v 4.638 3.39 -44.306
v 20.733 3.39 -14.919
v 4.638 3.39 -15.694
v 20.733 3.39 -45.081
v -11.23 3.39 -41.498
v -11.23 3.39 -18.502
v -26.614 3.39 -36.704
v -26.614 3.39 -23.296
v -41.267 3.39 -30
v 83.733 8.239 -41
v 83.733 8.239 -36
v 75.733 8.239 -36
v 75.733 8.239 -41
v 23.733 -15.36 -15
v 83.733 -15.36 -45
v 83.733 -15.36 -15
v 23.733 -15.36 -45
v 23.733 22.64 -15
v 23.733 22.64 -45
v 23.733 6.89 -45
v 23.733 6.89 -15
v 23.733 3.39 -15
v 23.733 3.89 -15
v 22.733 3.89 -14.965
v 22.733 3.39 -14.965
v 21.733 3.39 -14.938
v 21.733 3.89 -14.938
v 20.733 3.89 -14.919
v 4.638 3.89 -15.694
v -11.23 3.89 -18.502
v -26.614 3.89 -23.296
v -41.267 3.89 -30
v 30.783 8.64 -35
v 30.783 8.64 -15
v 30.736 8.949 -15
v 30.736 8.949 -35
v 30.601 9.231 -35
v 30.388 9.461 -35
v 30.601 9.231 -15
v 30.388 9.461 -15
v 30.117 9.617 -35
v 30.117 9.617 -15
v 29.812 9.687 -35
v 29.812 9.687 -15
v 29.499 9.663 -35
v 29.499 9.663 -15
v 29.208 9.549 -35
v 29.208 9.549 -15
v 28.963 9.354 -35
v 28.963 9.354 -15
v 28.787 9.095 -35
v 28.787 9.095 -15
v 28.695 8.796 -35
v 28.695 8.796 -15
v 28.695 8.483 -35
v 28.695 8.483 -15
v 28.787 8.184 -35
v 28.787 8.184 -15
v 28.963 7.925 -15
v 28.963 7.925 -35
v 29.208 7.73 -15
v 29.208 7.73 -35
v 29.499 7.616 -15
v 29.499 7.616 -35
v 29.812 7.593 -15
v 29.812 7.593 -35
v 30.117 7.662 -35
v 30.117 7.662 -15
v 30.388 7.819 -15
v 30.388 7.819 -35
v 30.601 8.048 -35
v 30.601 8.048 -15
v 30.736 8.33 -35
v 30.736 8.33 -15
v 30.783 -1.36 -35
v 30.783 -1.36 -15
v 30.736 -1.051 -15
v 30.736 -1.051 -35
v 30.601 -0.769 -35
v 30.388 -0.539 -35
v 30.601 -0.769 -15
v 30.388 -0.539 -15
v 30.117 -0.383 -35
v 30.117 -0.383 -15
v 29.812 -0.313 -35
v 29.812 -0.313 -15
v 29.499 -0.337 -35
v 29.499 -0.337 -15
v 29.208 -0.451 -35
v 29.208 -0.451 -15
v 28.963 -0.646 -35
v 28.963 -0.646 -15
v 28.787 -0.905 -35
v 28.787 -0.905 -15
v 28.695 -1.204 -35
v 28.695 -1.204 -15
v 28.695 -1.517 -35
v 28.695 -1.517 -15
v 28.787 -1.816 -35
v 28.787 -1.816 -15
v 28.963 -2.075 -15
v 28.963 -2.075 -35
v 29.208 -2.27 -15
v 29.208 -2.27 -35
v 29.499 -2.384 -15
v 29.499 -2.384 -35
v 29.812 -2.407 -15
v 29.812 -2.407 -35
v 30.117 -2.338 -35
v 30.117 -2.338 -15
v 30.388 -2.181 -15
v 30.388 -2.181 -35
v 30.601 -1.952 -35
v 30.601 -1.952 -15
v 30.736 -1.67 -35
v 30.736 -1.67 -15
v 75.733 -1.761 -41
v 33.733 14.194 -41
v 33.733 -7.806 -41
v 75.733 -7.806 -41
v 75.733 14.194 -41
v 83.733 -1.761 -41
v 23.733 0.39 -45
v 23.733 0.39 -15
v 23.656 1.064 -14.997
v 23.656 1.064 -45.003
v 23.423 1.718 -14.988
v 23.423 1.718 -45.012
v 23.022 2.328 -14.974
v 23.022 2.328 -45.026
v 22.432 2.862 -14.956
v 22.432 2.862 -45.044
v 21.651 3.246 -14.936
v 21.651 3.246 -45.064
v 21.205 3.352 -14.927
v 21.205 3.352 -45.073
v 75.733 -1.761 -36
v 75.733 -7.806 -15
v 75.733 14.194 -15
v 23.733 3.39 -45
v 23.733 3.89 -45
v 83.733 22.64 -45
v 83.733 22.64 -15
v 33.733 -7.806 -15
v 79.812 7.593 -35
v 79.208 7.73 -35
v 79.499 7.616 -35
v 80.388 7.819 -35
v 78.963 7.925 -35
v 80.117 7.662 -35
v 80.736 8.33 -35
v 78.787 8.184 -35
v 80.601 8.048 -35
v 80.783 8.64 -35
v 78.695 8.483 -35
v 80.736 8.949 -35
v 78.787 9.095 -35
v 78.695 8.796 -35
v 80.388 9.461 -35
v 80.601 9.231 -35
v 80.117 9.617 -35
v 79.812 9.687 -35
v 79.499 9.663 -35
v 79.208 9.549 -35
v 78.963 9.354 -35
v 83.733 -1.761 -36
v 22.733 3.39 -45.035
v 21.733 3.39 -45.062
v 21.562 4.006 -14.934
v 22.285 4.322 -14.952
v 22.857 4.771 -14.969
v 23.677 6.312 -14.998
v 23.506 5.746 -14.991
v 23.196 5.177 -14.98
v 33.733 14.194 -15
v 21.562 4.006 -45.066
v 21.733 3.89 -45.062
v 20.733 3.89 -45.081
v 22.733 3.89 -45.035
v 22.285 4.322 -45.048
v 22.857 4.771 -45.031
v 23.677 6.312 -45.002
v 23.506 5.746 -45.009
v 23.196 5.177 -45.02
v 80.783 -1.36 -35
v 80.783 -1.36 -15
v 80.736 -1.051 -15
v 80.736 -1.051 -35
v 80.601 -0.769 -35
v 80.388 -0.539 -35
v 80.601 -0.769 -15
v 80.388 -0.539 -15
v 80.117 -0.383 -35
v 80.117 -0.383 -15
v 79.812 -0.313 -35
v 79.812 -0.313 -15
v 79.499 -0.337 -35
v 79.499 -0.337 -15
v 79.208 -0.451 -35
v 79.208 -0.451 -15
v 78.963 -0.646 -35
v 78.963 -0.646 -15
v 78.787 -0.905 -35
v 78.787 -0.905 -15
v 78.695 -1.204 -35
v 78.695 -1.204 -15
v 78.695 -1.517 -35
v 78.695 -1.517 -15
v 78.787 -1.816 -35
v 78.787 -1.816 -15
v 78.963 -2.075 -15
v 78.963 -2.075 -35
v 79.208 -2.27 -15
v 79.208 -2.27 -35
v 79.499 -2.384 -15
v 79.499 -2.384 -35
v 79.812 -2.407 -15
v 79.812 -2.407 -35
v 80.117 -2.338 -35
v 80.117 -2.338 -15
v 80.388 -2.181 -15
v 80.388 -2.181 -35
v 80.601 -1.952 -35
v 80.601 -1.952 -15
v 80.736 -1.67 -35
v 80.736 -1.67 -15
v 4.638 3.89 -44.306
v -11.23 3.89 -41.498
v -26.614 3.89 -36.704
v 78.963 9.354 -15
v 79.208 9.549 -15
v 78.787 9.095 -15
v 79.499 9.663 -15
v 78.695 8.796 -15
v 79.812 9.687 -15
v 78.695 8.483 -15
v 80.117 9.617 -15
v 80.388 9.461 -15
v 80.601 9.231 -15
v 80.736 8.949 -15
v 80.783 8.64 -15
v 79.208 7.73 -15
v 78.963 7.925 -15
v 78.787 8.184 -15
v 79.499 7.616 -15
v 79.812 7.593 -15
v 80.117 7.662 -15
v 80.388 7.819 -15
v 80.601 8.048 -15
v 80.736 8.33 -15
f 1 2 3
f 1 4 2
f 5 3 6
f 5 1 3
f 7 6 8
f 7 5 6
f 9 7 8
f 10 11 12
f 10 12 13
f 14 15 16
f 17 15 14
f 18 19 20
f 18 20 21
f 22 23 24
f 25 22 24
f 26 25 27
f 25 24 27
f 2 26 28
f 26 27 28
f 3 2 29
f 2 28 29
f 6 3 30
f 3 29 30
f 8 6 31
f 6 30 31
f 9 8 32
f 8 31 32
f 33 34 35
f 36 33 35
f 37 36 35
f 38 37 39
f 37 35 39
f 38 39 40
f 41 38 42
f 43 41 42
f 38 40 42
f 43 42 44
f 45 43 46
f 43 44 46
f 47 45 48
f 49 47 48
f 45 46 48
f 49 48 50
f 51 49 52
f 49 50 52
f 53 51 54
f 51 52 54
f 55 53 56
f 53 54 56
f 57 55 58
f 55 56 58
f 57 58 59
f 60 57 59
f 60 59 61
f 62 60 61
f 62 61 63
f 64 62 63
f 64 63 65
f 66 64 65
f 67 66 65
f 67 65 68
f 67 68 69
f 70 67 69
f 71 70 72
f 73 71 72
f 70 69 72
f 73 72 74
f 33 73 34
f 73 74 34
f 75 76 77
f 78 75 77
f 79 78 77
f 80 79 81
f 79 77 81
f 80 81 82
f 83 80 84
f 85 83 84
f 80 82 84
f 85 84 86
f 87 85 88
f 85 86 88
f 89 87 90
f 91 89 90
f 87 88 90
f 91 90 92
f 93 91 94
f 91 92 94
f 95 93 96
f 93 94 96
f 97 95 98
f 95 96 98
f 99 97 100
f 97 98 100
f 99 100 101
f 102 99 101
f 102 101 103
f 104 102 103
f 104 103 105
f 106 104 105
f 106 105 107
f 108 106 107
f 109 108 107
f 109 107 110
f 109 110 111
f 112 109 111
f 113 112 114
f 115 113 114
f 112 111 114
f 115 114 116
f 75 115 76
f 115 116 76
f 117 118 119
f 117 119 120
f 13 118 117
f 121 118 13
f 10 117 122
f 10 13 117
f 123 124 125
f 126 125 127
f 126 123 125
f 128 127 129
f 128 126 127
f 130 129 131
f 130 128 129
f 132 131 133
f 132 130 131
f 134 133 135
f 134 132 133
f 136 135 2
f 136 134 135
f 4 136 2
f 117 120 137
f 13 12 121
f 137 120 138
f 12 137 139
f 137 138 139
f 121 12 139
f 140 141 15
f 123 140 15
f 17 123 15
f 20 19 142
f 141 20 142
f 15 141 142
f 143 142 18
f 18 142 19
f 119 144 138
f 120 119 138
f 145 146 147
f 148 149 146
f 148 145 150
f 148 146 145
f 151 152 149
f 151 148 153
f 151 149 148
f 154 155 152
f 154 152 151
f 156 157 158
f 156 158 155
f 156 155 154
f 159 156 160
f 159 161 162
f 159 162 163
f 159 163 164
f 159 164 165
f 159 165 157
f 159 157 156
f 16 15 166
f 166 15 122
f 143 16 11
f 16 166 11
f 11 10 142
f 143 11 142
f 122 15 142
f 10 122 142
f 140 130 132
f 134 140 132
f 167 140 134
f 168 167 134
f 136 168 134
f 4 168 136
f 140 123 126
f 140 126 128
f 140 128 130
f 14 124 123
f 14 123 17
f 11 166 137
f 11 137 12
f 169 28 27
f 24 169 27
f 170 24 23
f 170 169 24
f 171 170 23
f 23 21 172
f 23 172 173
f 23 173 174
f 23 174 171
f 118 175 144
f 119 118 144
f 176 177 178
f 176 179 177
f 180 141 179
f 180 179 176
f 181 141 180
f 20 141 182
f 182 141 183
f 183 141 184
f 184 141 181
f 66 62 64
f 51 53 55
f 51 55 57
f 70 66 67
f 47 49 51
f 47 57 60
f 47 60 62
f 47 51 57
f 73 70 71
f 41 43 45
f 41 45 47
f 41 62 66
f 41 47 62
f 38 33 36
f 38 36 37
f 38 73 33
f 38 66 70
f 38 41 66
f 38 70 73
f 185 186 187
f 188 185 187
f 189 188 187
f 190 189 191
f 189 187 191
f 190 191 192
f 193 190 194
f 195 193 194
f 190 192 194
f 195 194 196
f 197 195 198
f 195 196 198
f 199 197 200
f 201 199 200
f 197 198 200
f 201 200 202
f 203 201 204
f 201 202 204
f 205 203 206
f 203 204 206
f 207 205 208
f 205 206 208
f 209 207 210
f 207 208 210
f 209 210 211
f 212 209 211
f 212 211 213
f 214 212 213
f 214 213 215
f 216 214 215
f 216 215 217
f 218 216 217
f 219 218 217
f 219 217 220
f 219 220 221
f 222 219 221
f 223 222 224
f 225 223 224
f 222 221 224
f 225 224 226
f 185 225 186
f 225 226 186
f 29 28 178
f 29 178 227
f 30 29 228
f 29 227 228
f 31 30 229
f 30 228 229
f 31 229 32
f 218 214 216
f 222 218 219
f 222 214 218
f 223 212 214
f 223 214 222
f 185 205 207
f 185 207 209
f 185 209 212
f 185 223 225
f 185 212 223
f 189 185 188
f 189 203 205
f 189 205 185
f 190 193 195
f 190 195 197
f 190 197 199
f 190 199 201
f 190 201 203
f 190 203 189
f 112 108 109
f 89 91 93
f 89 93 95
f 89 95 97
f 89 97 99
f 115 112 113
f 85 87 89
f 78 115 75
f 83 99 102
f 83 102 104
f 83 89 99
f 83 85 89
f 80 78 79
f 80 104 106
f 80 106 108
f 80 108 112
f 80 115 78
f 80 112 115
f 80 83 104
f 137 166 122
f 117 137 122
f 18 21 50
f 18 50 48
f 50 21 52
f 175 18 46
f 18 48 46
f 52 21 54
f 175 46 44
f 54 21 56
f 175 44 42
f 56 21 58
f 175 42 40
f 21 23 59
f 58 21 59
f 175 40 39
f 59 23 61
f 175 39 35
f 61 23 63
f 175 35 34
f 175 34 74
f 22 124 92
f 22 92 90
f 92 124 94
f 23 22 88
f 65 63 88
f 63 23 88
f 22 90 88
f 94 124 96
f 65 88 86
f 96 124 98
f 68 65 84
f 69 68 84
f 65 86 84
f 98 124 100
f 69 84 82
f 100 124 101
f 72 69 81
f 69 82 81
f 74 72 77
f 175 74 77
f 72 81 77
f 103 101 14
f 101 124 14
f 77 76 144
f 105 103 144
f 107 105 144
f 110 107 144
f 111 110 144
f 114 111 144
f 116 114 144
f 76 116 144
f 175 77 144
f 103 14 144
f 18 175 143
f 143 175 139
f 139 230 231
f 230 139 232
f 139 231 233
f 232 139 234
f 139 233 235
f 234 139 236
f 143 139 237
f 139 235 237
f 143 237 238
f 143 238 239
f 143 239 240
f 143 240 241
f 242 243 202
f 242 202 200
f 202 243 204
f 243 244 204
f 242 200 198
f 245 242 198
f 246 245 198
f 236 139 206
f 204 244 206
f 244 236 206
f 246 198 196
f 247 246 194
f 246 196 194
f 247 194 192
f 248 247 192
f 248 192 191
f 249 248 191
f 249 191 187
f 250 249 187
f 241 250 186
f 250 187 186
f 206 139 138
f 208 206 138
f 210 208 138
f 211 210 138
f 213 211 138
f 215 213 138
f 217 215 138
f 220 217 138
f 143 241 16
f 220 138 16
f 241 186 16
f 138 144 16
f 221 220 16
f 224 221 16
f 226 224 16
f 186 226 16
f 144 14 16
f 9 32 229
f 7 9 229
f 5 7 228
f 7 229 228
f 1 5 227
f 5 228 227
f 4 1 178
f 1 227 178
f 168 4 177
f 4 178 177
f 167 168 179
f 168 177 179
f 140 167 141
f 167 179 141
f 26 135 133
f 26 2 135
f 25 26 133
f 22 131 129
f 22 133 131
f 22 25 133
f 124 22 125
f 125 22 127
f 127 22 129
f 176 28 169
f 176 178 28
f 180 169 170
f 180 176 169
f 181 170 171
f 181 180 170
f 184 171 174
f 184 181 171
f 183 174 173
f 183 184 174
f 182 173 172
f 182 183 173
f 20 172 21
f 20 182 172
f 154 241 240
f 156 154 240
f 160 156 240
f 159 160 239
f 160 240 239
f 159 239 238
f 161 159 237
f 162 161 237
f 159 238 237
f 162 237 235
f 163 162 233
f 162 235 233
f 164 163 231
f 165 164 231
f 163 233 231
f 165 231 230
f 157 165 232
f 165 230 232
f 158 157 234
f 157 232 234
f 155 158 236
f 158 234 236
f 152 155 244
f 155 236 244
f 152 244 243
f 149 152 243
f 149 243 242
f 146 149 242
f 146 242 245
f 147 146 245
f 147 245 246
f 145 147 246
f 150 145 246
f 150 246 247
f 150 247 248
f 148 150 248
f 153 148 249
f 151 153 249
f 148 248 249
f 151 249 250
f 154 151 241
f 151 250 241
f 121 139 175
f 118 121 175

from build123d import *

# Parameters (mm, degrees)
BOSS_EXTRUDE1_DEPTH  = 4
CUT_EXTRUDE1_DEPTH   = 3
SKETCH5_W            = 49
SKETCH5_H            = 16
BOSS_EXTRUDE2_DEPTH  = 4
BOSS_EXTRUDE15_DEPTH = 30
SKETCH20_R           = 2.4
CUT_EXTRUDE26_DEPTH  = 1
FILLET8_R            = 4
FILLET12_R           = 4
CUT_EXTRUDE_8_DEPTH  = 28
SKETCH_6_R           = 1.05
CUT_EXTRUDE_9_DEPTH  = 20
SKETCH_8_W           = 6
SKETCH_8_H           = 10
CUT_EXTRUDE_10_DEPTH = 8
BOSS_EXTRUDE14_DEPTH = 4
CUT_EXTRUDE27_DEPTH  = 19
BOSS_EXTRUDE16_DEPTH = 19.25
CUT_EXTRUDE28_DEPTH  = 18.75
FILLET13_R           = 3
FILLET14_R           = 3


with BuildPart() as part:
    # Sketch2 → Boss-Extrude1 (new body)
    with BuildSketch(Plane.XY):
        with BuildLine():
            Line((23.733047461, 11.63962887), (23.733047461, -4.36037113))
            Line((23.733047461, -4.36037113), (-21.266952539, -4.36037113))
            ThreePointArc((-21.266952539, -4.36037113), (-27.597931628, 3.63962887), (-21.266952539, 11.63962887))
            Line((-21.266952539, 11.63962887), (23.733047461, 11.63962887))
        make_face()
    extrude(amount=BOSS_EXTRUDE1_DEPTH)

    # Sketch1 → Cut-Extrude1 (cut)
    with BuildSketch(Plane.XY):
        with BuildLine():
            Line((-6.25004119, 8.63962887), (-20.04279291, 6.23962887))
            ThreePointArc((-20.04279291, 6.23962887), (-22.105421524, 3.63962887), (-20.04279291, 1.03962887))
            Line((-20.04279291, 1.03962887), (-6.25004119, -1.36037113))
            ThreePointArc((-6.25004119, -1.36037113), (-2.105421524, -2.86037113), (2.039198142, -1.36037113))
            Line((2.039198142, -1.36037113), (15.831949862, 1.03962887))
            ThreePointArc((15.831949862, 1.03962887), (17.894578476, 3.63962887), (15.831949862, 6.23962887))
            Line((15.831949862, 6.23962887), (2.039198142, 8.63962887))
            ThreePointArc((2.039198142, 8.63962887), (-2.105421524, 10.13962887), (-6.25004119, 8.63962887))
        make_face()
    extrude(amount=CUT_EXTRUDE1_DEPTH, mode=Mode.SUBTRACT)

    # Sketch5 → Boss-Extrude2 (add)
    with BuildSketch(Plane(origin=(23.733047461, 0, 0), x_dir=(0, 0, -1), z_dir=(1, 0, 0))):
        with Locations((20.5, 3.63962887)):
            Rectangle(SKETCH5_W, SKETCH5_H)
    extrude(amount=BOSS_EXTRUDE2_DEPTH)

    # Sketch6 → Boss-Extrude15 (add)
    with BuildSketch(Plane(origin=(0, 0, -45), x_dir=(-1, 0, 0), z_dir=(0, 0, -1))):
        Polygon((-30.946192459, -15.36037113), (-83.733047461, -15.36037113), (-83.733047461, 22.63962887), (-23.733047461, 22.63962887), (-23.733047461, -15.36037113), align=None)
    extrude(amount=-BOSS_EXTRUDE15_DEPTH)

    # Sketch20 → Cut-Extrude26 (cut)
    with BuildSketch(Plane(origin=(0, 0, 3), x_dir=(-1, 0, 0), z_dir=(0, 0, -1))):
        with Locations((2.105421524, 3.63962887)):
            Circle(SKETCH20_R)
    extrude(amount=-CUT_EXTRUDE26_DEPTH, mode=Mode.SUBTRACT)

    # Fillet8
    fillet8_edges = [part.edges().sort_by_distance(p)[0] for p in [
        (23.733047461, 3.63962887, 0),
    ]]
    fillet(fillet8_edges, radius=FILLET8_R)

    # Fillet12
    fillet12_edges = [part.edges().sort_by_distance(p)[0] for p in [
        (27.733047461, 3.63962887, 4),
    ]]
    fillet(fillet12_edges, radius=FILLET12_R)

    # 草圖5 → 除料-伸長8 (cut)
    with BuildSketch(Plane.XY.offset(-15)):
        Polygon((75.733047461, -7.806095257), (75.733047461, 14.193904743), (33.733047461, 14.193904743), (33.733047461, 3.193904743), (33.733047461, -7.806095257), align=None)
    extrude(amount=-CUT_EXTRUDE_8_DEPTH, mode=Mode.SUBTRACT)

    # 草圖6 → 除料-伸長9 (cut)
    with BuildSketch(Plane.XY.offset(-15)):
        with Locations((29.733047461, 8.63962887)):
            Circle(SKETCH_6_R)
        with Locations((29.733047461, -1.36037113)):
            Circle(SKETCH_6_R)
        with Locations((79.733047461, 8.63962887)):
            Circle(SKETCH_6_R)
        with Locations((79.733047461, -1.36037113)):
            Circle(SKETCH_6_R)
    extrude(amount=-CUT_EXTRUDE_9_DEPTH, mode=Mode.SUBTRACT)

    # 草圖8 → 除料-伸長10 (cut)
    with BuildSketch(Plane(origin=(83.733047461, 0, 0), x_dir=(0, 0, -1), z_dir=(1, 0, 0))):
        with Locations((39, 3.238584995)):
            Rectangle(SKETCH_8_W, SKETCH_8_H)
    extrude(amount=-CUT_EXTRUDE_10_DEPTH, mode=Mode.SUBTRACT)

    # Sketch6<2> → Boss-Extrude14 (add)
    with BuildSketch(Plane(origin=(0, 0, -45), x_dir=(-1, 0, 0), z_dir=(0, 0, -1))):
        Polygon((-30.946192459, -15.36037113), (-83.733047461, -15.36037113), (-83.733047461, 22.63962887), (-23.733047461, 22.63962887), (-23.733047461, -15.36037113), align=None)
    extrude(amount=-BOSS_EXTRUDE14_DEPTH)

    # Sketch21 → Cut-Extrude27 (cut)
    with BuildSketch(Plane.XY.offset(4)):
        Polygon((-21.266952539, 11.63962887), (23.733047461, 11.63962887), (27.733047461, 11.63962887), (27.733047461, -4.36037113), (-21.266952539, -4.36037113), (-27.597931628, -4.36037113), (-27.597931628, 3.63962887), (-27.597931628, 11.63962887), align=None)
    extrude(amount=-CUT_EXTRUDE27_DEPTH, mode=Mode.SUBTRACT)

    # Sketch26 → Boss-Extrude16 (add)
    with BuildSketch(Plane(origin=(0, 22.63962887, 0), x_dir=(1, 0, 0), z_dir=(0, 1, 0))):
        with BuildLine():
            Line((23.733047461, 45), (23.733047461, 15))
            ThreePointArc((23.733047461, 15), (-9.769414537, 18.155998007), (-41.266952539, 30))
            ThreePointArc((-41.266952539, 30), (-9.769414537, 41.844001993), (23.733047461, 45))
        make_face()
    extrude(amount=-BOSS_EXTRUDE16_DEPTH)

    # Sketch26<2> → Cut-Extrude28 (cut)
    with BuildSketch(Plane(origin=(0, 22.63962887, 0), x_dir=(1, 0, 0), z_dir=(0, 1, 0))):
        with BuildLine():
            Line((23.733047461, 45), (23.733047461, 15))
            ThreePointArc((23.733047461, 15), (-9.769414537, 18.155998007), (-41.266952539, 30))
            ThreePointArc((-41.266952539, 30), (-9.769414537, 41.844001993), (23.733047461, 45))
        make_face()
    extrude(amount=-CUT_EXTRUDE28_DEPTH, mode=Mode.SUBTRACT)

    # Fillet13
    # the kernel refuses this fillet: 3 mm, written as the material it adds along each edge
    with BuildSketch(Plane(origin=(23.733047461, 3.38962887, -52.5), x_dir=(0, -1, 0), z_dir=(0, 0, 1))) as fillet13_piece_1_section:
        with BuildLine():
            CenterArc((FILLET13_R, -FILLET13_R), FILLET13_R, 90, 90)
            Line((0, -FILLET13_R), (0, 0))
            Line((0, 0), (FILLET13_R, 0))
        make_face()
    fillet13_piece_1 = extrude(amount=37.5, mode=Mode.PRIVATE)
    fillet13_piece_1 = split(fillet13_piece_1, bisect_by=Plane(origin=(22.499991294, 3.049704753, -45), z_dir=(0, 0, -1)), keep=Keep.TOP, mode=Mode.PRIVATE)
    fillet13_piece_1 = fillet13_piece_1 & Plane(origin=(18.787742814, 3.049704753, 81.90367986), x_dir=(-0.472871616946814, 0, -0.8811313374781911), z_dir=(0, 1, 0)) * Cylinder(127, 87, mode=Mode.PRIVATE)
    add(fillet13_piece_1)
    with BuildSketch(Plane(origin=(23.733047461, 3.38962887, -45), x_dir=(0, -1, 0), z_dir=(0, 0, 1))) as fillet13_piece_2:
        with BuildLine():
            CenterArc((FILLET13_R, -FILLET13_R), FILLET13_R, 90, 90)
            Line((0, -FILLET13_R), (0, 0))
            Line((0, 0), (FILLET13_R, 0))
        make_face()
    extrude(amount=30)
    with BuildSketch(Plane(origin=(23.733047461, 3.38962887, -45), x_dir=(0, -1, 0), z_dir=(0, 0, 1))) as fillet13_piece_3_section:
        with BuildLine():
            CenterArc((FILLET13_R, -FILLET13_R), FILLET13_R, 90, 90)
            Line((0, -FILLET13_R), (0, 0))
            Line((0, 0), (FILLET13_R, 0))
        make_face()
    fillet13_piece_3 = extrude(amount=37.5, mode=Mode.PRIVATE)
    fillet13_piece_3 = split(fillet13_piece_3, bisect_by=Plane(origin=(22.499977065, 3.049704014, -15), z_dir=(0, 0, 1)), keep=Keep.TOP, mode=Mode.PRIVATE)
    fillet13_piece_3 = fillet13_piece_3 & Plane(origin=(18.787742814, 3.049704014, -141.90367986), x_dir=(0.03893940667523239, 0, 0.9992415736986632), z_dir=(0, 1, 0)) * Cylinder(127, 87, mode=Mode.PRIVATE)
    add(fillet13_piece_3)

    # Fillet14
    # the kernel refuses this fillet: 3 mm, written as the material it adds along each edge
    with BuildSketch(Plane(origin=(23.733047461, 3.88962887, -52.5), x_dir=(-1, 0, 0), z_dir=(0, 0, 1))) as fillet14_piece_1_section:
        with BuildLine():
            CenterArc((FILLET14_R, -FILLET14_R), FILLET14_R, 90, 90)
            Line((0, -FILLET14_R), (0, 0))
            Line((0, 0), (FILLET14_R, 0))
        make_face()
    fillet14_piece_1 = extrude(amount=37.5, mode=Mode.PRIVATE)
    fillet14_piece_1 = fillet14_piece_1 & Plane(origin=(18.787742814, 4.229564141, 81.90367986), x_dir=(-0.472871616947038, 0, -0.8811313374780708), z_dir=(0, 1, 0)) * Cylinder(127, 87, mode=Mode.PRIVATE)
    fillet14_piece_1 = split(fillet14_piece_1, bisect_by=Plane(origin=(22.499997124, 4.229564141, -45), z_dir=(0, 0, -1)), keep=Keep.TOP, mode=Mode.PRIVATE)
    add(fillet14_piece_1)
    with BuildSketch(Plane(origin=(23.733047461, 3.88962887, -45), x_dir=(-1, 0, 0), z_dir=(0, 0, 1))) as fillet14_piece_2:
        with BuildLine():
            CenterArc((FILLET14_R, -FILLET14_R), FILLET14_R, 90, 90)
            Line((0, -FILLET14_R), (0, 0))
            Line((0, 0), (FILLET14_R, 0))
        make_face()
    extrude(amount=30)
    with BuildSketch(Plane(origin=(23.733047461, 3.88962887, -45), x_dir=(-1, 0, 0), z_dir=(0, 0, 1))) as fillet14_piece_3_section:
        with BuildLine():
            CenterArc((FILLET14_R, -FILLET14_R), FILLET14_R, 90, 90)
            Line((0, -FILLET14_R), (0, 0))
            Line((0, 0), (FILLET14_R, 0))
        make_face()
    fillet14_piece_3 = extrude(amount=37.5, mode=Mode.PRIVATE)
    fillet14_piece_3 = fillet14_piece_3 & Plane(origin=(18.787742814, 4.229551156, -141.90367986), x_dir=(0.03893940667498725, 0, 0.9992415736986727), z_dir=(0, 1, 0)) * Cylinder(127, 87, mode=Mode.PRIVATE)
    fillet14_piece_3 = split(fillet14_piece_3, bisect_by=Plane(origin=(22.499980416, 4.229551156, -15), z_dir=(0, 0, 1)), keep=Keep.TOP, mode=Mode.PRIVATE)
    add(fillet14_piece_3)


solid = part.part
